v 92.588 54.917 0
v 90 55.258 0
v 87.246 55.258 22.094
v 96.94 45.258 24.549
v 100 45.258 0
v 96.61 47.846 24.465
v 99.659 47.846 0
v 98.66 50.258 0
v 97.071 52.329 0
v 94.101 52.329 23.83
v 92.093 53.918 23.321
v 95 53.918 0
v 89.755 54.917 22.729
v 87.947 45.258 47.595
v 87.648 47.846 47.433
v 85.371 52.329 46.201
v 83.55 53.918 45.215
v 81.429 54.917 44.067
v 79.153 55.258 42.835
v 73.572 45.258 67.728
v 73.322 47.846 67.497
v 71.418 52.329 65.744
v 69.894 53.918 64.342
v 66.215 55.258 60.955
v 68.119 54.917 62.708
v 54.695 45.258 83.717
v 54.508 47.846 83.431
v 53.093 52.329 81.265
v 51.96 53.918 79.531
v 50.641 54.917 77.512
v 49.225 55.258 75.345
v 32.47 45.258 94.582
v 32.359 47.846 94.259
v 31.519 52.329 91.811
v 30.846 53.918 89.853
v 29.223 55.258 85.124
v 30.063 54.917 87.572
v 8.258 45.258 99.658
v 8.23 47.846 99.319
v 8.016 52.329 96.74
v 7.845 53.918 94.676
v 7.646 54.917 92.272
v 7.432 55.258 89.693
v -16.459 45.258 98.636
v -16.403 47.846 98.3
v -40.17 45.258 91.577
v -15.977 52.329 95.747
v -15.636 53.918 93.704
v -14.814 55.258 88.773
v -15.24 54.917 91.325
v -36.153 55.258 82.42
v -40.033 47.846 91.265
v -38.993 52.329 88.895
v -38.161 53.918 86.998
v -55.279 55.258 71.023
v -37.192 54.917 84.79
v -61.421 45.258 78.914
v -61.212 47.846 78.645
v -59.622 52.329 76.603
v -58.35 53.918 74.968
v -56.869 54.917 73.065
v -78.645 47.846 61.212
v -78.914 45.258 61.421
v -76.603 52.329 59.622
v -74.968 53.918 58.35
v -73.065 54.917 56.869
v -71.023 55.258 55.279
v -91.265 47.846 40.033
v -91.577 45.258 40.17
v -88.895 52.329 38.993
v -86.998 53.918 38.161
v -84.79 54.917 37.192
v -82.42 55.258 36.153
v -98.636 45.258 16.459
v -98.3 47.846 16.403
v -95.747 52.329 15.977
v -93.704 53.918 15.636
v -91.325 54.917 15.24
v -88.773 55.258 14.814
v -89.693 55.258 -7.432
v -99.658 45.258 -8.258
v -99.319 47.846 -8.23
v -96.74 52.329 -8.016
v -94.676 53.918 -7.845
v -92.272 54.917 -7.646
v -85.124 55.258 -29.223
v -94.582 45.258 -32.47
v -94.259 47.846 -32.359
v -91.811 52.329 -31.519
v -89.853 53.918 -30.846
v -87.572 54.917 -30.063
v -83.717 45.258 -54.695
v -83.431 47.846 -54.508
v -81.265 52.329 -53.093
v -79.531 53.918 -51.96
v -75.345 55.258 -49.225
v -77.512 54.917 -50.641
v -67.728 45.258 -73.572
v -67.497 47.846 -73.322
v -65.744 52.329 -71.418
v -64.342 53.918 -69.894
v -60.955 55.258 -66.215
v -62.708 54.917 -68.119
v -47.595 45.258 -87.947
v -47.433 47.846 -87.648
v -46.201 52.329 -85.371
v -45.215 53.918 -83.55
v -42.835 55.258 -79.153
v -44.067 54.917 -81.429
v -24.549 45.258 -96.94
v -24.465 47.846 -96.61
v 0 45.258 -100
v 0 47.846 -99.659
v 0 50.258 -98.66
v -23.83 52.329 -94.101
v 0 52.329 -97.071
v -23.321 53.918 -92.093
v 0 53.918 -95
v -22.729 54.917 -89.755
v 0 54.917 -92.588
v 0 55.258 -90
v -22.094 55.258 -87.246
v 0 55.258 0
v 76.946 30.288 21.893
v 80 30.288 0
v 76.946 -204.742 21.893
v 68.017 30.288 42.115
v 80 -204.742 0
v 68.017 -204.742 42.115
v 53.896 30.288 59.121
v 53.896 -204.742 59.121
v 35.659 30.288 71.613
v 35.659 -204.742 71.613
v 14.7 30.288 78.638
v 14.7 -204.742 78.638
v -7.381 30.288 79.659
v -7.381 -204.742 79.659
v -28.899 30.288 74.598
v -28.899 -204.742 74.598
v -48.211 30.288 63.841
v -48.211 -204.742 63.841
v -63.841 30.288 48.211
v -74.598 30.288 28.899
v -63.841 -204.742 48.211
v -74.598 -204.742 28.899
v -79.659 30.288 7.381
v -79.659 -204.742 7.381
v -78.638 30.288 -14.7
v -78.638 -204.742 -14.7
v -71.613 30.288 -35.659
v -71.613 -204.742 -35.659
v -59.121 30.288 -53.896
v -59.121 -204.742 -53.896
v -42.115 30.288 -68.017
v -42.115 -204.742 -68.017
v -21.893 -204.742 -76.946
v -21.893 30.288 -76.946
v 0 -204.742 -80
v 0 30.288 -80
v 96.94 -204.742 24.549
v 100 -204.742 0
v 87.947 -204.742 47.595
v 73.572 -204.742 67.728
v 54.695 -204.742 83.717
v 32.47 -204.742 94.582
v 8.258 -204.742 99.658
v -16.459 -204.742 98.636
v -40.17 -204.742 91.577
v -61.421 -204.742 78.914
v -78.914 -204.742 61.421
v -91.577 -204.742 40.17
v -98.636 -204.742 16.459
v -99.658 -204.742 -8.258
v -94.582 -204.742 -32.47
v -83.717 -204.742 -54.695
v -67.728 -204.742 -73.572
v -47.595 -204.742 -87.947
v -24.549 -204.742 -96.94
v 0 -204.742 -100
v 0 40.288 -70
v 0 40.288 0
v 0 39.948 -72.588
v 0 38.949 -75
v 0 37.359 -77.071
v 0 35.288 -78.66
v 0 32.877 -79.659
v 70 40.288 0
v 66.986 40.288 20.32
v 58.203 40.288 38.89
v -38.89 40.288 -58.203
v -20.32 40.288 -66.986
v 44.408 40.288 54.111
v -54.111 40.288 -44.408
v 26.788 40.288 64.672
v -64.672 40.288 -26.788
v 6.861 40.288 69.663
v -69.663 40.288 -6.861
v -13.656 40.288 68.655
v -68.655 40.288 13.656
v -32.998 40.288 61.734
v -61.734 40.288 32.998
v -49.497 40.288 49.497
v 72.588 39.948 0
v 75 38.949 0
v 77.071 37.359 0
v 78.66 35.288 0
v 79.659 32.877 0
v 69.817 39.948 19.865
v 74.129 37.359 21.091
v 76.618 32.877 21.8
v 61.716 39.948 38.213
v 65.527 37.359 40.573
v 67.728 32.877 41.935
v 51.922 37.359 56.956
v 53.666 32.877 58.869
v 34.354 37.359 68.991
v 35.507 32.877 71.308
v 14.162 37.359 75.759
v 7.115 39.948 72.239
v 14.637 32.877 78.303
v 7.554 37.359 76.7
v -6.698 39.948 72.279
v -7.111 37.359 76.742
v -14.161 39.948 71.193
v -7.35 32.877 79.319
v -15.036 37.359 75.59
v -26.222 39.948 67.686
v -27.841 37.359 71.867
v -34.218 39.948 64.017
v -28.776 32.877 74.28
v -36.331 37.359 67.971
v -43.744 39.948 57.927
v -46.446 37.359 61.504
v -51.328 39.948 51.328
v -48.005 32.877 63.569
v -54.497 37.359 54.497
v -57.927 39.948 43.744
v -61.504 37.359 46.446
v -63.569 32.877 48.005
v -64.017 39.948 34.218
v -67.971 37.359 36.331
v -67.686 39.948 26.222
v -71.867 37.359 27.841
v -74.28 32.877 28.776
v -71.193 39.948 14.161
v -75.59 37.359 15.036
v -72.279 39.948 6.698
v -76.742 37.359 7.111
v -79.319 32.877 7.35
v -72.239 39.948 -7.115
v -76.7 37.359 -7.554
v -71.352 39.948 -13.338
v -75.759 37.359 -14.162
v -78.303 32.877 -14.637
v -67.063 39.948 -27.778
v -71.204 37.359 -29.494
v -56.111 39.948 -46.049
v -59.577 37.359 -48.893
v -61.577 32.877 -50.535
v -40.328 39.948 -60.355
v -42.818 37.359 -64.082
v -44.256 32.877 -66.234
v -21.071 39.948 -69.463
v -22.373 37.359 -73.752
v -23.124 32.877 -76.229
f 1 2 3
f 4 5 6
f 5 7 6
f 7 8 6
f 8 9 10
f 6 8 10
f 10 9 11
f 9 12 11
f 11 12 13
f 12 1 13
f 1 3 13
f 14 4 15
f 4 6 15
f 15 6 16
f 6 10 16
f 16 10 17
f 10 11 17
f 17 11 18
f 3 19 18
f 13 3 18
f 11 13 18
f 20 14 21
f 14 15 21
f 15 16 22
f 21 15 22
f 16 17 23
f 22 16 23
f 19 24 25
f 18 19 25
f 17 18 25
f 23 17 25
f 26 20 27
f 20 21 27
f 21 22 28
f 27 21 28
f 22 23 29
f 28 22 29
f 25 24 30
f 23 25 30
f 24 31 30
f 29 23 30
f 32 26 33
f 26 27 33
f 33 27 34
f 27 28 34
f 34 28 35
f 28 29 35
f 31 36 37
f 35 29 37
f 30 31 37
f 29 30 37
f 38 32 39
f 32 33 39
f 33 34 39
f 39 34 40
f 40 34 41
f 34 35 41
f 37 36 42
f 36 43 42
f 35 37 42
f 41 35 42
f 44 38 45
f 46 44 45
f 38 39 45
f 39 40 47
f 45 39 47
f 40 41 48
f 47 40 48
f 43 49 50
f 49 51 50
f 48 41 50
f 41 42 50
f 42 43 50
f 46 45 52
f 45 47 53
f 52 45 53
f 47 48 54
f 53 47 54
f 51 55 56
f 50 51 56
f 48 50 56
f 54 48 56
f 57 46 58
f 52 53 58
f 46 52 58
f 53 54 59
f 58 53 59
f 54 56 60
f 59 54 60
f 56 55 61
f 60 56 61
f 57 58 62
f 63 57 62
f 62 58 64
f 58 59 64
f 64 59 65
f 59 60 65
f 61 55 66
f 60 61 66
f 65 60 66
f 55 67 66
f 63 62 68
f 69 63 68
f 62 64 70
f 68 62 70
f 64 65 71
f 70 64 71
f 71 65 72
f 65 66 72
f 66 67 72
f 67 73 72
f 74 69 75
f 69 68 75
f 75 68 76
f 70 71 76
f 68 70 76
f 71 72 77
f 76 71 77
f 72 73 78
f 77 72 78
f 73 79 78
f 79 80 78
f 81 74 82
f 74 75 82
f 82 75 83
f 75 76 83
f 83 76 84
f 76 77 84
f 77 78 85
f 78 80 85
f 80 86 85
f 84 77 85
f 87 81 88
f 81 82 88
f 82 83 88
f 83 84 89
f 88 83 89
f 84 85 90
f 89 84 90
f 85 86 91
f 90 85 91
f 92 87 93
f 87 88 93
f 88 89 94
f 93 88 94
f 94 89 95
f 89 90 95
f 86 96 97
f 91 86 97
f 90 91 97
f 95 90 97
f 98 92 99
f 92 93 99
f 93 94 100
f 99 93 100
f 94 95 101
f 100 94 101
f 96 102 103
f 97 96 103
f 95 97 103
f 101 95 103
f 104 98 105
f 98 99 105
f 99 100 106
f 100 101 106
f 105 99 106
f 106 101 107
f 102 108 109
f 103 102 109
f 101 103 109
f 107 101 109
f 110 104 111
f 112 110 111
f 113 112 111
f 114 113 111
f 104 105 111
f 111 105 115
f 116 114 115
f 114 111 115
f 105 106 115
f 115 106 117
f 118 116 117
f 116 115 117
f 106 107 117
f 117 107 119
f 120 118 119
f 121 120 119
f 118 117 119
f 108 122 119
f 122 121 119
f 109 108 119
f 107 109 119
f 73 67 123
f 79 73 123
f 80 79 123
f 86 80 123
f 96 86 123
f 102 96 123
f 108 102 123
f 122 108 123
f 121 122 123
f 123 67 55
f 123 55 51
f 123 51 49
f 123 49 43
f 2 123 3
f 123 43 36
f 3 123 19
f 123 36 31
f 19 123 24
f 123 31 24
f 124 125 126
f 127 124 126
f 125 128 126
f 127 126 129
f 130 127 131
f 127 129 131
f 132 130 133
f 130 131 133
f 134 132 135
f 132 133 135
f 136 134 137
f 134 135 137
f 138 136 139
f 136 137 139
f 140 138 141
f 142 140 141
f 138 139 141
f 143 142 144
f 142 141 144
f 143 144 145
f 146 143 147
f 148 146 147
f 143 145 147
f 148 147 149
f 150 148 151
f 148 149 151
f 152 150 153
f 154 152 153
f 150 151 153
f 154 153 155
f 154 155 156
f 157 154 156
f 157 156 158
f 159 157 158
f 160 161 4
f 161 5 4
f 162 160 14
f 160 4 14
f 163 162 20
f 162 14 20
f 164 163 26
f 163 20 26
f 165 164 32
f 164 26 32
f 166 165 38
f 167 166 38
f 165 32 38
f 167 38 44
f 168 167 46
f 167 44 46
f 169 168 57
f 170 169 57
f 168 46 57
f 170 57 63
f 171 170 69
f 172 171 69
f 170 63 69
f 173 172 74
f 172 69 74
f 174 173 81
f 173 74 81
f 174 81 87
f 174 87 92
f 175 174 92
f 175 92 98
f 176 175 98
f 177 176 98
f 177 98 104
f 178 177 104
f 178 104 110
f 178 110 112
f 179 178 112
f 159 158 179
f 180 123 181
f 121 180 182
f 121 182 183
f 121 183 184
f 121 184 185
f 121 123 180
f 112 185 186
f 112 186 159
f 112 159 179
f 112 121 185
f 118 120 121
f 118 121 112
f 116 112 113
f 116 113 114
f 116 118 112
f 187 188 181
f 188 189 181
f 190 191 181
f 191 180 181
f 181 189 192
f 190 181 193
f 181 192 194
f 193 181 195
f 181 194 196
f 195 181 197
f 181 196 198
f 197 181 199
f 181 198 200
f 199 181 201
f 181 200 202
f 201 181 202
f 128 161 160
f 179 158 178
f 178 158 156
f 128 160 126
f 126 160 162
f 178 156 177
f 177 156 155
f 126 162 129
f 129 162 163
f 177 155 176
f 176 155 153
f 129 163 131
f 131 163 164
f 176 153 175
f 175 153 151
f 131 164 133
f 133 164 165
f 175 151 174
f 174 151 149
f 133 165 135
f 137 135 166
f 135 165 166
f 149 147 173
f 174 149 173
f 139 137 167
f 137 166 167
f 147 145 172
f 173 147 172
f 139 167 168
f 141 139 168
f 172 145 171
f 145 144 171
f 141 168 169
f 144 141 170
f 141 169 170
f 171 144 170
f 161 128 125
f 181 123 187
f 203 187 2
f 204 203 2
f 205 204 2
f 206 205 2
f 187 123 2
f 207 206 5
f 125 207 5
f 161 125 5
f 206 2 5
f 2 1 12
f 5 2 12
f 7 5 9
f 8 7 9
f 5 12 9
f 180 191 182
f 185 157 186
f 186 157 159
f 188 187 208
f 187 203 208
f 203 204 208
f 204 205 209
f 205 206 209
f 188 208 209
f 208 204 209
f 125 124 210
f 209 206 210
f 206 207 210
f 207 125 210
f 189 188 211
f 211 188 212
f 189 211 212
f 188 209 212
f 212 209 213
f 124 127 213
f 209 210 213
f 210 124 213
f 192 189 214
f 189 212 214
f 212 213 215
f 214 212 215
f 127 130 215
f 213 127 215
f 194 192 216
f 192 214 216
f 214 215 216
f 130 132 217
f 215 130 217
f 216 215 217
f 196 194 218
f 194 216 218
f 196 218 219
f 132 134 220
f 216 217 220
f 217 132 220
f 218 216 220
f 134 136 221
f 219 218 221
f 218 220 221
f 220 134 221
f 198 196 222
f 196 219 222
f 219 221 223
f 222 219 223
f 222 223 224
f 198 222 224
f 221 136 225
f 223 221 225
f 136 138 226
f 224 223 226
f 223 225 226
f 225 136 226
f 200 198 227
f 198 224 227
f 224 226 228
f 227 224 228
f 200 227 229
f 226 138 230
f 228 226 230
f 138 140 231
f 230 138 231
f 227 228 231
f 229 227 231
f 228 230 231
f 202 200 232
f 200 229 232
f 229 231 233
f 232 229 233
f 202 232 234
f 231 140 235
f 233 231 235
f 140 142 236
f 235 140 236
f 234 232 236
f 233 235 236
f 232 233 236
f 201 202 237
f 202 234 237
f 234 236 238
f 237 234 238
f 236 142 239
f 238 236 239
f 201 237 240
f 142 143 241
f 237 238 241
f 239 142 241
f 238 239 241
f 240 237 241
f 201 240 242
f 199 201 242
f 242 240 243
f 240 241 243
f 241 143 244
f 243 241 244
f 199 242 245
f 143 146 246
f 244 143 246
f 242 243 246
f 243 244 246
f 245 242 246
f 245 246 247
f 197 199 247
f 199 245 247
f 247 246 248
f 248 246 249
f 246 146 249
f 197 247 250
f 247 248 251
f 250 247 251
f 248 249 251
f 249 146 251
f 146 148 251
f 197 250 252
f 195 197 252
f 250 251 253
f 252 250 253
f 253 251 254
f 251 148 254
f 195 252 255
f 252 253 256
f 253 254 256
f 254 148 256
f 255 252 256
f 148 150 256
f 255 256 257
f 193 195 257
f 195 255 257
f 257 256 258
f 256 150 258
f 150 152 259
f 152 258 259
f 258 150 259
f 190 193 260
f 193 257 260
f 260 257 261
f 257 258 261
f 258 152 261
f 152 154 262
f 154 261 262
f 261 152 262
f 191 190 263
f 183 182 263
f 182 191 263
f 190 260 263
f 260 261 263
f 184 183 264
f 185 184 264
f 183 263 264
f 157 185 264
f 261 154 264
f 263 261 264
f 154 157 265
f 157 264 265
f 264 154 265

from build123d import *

# Parameters (mm, degrees)
REVOLVE1_ANGLE = 270


with BuildPart() as part:
    # Sketch1 → Revolve1 (revolve)
    with BuildSketch(Plane.XY):
        with BuildLine():
            Line((0, 40.288428911), (70, 40.288428911))
            ThreePointArc((70, 40.288428911), (77.071067812, 37.359496723), (80, 30.288428911))
            Line((80, 30.288428911), (80, -204.742322884))
            Line((80, -204.742322884), (100, -204.742322884))
            Line((100, -204.742322884), (100, 45.257677116))
            ThreePointArc((100, 45.257677116), (97.071067812, 52.328744927), (90, 55.257677116))
            Line((90, 55.257677116), (0, 55.257677116))
            Line((0, 55.257677116), (0, 40.288428911))
        make_face()
    revolve(axis=Axis((0, 40.288428911, 0), (0, -1, 0)), revolution_arc=REVOLVE1_ANGLE)


solid = part.part
